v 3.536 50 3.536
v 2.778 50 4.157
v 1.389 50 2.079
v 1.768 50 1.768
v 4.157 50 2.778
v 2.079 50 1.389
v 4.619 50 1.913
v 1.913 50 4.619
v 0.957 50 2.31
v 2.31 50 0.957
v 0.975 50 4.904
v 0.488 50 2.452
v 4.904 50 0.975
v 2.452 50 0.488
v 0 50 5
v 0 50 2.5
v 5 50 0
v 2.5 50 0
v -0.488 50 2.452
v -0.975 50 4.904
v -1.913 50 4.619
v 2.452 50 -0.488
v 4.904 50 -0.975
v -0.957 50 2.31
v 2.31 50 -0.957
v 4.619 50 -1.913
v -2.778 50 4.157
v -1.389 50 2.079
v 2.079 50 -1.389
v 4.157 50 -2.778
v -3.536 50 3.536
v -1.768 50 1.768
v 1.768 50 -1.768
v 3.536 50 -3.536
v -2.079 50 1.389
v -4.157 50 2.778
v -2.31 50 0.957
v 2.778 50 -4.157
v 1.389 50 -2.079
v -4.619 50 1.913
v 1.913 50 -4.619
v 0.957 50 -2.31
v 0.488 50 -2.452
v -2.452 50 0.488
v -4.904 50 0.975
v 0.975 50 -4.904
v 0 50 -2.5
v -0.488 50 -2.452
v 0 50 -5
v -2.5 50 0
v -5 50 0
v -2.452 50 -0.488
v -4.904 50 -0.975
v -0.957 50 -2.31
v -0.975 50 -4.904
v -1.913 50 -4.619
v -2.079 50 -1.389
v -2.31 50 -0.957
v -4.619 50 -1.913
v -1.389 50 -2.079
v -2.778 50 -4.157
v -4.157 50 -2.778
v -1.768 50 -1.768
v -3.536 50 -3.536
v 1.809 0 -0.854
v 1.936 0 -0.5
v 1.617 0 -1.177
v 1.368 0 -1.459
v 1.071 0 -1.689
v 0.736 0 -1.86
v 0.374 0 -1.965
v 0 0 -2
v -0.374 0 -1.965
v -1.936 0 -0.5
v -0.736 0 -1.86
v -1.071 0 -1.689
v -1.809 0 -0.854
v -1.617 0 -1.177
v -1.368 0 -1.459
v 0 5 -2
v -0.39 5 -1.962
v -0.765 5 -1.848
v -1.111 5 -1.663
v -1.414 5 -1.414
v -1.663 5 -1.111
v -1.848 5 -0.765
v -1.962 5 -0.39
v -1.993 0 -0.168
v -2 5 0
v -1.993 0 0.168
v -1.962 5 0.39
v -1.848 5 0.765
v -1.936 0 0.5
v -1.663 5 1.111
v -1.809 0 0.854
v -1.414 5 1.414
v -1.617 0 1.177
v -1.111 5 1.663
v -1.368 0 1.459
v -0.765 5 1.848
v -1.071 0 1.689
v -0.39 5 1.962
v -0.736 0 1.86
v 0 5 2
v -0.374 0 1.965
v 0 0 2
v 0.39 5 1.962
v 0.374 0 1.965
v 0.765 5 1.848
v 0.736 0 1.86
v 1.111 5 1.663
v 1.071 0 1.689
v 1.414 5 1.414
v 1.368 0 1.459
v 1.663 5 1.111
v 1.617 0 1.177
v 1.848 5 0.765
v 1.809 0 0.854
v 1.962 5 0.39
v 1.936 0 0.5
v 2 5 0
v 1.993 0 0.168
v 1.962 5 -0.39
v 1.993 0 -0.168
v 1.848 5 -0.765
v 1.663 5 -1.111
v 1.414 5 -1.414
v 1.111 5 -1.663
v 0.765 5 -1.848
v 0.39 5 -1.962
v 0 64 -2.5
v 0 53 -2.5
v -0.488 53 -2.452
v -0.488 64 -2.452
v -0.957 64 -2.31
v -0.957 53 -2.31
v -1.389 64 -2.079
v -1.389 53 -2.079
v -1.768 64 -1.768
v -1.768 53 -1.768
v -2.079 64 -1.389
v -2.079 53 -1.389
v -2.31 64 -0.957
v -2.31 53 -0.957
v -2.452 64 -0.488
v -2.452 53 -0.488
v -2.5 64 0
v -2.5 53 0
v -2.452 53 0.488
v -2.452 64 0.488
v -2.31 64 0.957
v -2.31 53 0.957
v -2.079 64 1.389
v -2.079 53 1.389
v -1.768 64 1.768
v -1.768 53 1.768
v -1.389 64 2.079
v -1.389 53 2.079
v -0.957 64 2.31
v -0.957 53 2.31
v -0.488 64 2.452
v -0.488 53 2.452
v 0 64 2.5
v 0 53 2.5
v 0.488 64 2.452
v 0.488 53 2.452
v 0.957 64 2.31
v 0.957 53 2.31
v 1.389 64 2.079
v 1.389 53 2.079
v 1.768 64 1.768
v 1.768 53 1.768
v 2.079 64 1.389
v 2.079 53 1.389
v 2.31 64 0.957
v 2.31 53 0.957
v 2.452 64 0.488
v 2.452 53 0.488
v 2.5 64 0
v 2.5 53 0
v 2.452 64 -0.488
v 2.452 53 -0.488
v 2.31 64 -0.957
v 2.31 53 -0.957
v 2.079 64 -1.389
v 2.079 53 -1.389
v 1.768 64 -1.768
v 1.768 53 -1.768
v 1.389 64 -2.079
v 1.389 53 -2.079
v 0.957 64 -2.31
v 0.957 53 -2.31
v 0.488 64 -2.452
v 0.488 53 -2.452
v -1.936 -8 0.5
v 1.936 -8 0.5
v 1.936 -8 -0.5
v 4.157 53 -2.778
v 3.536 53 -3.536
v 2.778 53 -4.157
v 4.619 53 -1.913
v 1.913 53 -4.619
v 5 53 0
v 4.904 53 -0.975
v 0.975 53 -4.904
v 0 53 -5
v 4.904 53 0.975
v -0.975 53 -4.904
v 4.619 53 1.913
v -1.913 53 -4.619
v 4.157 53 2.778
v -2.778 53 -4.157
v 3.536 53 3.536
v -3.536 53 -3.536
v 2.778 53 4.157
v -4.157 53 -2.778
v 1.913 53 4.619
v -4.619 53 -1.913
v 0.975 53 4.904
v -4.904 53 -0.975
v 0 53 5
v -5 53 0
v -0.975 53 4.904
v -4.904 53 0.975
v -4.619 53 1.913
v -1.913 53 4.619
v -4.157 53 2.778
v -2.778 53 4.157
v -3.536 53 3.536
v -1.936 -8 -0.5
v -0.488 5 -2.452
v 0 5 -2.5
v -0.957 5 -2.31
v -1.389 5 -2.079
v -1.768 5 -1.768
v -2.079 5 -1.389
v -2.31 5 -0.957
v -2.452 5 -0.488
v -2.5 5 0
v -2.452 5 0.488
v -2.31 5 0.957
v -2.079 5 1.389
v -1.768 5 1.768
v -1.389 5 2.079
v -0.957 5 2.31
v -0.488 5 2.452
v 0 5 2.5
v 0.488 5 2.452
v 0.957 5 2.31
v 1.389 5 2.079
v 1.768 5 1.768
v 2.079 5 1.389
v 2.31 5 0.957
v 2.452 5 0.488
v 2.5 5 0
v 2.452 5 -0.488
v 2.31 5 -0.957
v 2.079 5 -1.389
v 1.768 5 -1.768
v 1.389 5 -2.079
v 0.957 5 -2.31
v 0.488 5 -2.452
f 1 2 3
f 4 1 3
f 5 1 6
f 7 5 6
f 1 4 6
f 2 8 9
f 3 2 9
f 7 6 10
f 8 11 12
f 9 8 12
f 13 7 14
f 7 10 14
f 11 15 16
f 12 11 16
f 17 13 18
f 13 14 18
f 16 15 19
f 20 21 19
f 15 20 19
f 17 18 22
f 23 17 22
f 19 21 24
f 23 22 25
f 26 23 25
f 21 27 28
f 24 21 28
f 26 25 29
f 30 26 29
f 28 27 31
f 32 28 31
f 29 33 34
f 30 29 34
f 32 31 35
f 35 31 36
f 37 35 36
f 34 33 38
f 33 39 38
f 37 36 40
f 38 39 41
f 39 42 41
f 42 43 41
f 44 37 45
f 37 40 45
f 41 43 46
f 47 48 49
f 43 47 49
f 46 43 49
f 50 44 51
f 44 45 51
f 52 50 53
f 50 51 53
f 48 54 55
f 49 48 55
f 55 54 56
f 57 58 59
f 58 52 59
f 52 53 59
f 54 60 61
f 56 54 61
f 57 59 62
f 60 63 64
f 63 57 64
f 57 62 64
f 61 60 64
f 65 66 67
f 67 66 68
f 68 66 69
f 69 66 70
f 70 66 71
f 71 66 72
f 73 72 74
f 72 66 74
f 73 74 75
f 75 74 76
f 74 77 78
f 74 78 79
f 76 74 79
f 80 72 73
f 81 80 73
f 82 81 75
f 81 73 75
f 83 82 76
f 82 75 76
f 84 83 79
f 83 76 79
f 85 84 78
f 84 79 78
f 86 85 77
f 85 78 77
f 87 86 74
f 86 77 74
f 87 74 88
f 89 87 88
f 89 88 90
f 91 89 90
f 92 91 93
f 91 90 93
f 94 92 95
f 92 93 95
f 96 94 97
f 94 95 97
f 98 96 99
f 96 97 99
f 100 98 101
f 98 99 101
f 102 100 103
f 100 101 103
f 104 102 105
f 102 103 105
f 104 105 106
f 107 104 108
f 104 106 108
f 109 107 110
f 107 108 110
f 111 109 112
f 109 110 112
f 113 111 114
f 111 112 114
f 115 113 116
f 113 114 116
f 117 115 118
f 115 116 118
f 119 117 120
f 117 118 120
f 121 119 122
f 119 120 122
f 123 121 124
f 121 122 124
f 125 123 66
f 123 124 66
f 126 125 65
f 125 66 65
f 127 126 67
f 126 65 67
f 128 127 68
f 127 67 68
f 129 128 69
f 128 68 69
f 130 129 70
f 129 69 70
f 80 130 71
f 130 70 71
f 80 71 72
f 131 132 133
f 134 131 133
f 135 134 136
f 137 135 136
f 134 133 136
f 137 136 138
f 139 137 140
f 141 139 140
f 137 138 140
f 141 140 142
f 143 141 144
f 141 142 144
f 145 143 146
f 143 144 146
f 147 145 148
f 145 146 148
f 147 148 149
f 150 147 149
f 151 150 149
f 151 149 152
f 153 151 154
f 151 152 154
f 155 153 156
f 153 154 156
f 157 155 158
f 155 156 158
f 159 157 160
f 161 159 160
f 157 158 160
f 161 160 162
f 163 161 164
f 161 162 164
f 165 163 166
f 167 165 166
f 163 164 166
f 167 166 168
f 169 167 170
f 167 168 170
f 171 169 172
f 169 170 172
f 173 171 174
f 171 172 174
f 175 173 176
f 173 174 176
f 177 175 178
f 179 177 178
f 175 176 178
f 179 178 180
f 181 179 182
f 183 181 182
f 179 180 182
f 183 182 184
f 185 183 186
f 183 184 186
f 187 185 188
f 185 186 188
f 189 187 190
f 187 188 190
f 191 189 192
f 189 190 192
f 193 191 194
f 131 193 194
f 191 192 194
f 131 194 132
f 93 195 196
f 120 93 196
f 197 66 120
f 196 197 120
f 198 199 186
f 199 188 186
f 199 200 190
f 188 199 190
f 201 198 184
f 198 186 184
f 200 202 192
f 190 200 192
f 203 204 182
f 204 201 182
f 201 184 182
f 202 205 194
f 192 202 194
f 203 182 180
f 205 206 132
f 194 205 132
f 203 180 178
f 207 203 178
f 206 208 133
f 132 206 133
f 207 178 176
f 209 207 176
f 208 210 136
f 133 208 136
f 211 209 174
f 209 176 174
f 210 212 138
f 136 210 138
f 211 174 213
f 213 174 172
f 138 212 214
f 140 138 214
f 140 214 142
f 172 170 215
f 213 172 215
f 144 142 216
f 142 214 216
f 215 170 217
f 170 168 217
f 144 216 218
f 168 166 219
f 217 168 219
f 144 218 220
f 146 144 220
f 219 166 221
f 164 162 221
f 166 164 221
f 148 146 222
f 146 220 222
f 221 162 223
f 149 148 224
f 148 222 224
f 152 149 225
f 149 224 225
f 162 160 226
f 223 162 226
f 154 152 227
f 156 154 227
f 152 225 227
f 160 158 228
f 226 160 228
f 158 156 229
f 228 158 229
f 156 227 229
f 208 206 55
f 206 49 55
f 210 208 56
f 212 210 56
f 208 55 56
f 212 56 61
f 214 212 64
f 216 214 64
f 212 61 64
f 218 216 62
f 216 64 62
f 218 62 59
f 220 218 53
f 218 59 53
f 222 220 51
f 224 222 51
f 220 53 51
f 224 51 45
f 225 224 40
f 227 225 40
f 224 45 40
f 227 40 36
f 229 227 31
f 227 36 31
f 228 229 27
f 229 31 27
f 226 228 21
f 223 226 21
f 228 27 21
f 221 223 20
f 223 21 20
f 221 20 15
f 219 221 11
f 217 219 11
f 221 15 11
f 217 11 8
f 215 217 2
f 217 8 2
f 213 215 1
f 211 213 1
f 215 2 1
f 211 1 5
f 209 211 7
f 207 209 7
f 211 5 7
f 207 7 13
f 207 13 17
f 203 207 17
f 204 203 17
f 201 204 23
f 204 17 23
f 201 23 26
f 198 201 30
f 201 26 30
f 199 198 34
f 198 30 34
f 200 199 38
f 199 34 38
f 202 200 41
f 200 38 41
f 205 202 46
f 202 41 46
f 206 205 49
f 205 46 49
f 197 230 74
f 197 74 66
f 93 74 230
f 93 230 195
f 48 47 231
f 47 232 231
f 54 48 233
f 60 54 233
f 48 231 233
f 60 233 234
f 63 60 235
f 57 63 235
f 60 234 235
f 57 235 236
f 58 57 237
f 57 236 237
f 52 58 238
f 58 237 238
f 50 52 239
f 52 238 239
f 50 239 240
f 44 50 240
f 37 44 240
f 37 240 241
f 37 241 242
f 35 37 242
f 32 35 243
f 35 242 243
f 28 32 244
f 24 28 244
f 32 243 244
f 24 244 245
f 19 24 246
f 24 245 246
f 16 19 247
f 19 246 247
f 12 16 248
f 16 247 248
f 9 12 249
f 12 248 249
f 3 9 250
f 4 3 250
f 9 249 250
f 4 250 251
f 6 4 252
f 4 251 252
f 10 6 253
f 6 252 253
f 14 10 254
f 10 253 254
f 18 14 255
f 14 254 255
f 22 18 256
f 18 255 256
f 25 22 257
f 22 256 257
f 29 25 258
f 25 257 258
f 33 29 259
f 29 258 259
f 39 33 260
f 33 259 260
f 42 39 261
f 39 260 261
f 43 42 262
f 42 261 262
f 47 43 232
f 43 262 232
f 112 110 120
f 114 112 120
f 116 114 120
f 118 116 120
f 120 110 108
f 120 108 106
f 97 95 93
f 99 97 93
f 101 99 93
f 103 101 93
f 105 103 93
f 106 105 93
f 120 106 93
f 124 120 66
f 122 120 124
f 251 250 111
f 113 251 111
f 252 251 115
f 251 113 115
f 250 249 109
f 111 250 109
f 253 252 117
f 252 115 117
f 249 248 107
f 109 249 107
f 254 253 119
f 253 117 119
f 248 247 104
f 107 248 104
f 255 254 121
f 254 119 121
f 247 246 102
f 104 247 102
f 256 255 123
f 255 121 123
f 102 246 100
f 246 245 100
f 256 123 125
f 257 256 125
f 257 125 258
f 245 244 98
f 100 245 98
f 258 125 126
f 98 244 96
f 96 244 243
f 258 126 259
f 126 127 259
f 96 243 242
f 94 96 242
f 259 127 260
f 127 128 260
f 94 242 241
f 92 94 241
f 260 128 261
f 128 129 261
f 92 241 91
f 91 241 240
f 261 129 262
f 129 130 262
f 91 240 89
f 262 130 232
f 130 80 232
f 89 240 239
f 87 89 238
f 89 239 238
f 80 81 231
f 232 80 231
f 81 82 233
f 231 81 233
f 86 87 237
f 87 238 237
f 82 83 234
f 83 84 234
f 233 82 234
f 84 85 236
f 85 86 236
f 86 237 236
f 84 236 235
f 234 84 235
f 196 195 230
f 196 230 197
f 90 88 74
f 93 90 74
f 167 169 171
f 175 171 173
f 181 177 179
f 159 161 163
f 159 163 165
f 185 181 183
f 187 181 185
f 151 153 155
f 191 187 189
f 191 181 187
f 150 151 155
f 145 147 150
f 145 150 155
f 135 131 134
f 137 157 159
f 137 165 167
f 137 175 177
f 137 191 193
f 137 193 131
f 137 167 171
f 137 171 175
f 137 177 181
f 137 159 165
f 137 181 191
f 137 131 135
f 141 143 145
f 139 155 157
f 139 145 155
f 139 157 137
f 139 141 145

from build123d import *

# Parameters (mm, degrees)
SKETCH4_W           = 3.872983346
SKETCH4_H           = 1
BOSS_EXTRUDE1_DEPTH = 8
SKETCH5_R           = 2.5
BOSS_EXTRUDE2_DEPTH = 11


with BuildPart() as part:
    # Sketch2 → Revolve1 (revolve)
    with BuildSketch(Plane.XY, mode=Mode.PRIVATE) as revolve1_sk:
        Polygon((0, 0), (0, 50), (0, 53), (5, 53), (5, 50), (2.5, 50), (2.5, 5), (2, 5), (2, 0), align=None)
    revolve(revolve1_sk.sketch.rotate(Axis((0, 0, 0), (0, 1, 0)), 90), axis=Axis((0, 0, 0), (0, 1, 0)))

    # Sketch4 → Boss-Extrude1 (add)
    with BuildSketch(Plane.XZ):
        Rectangle(SKETCH4_W, SKETCH4_H)
    extrude(amount=BOSS_EXTRUDE1_DEPTH)

    # Sketch5 → Boss-Extrude2 (add)
    with BuildSketch(Plane(origin=(0, 53, 0), x_dir=(1, 0, 0), z_dir=(0, 1, 0))):
        with Locations(Location((0, 0, 0), (0, 0, 90))):
            Circle(SKETCH5_R)
    extrude(amount=BOSS_EXTRUDE2_DEPTH)


solid = part.part
